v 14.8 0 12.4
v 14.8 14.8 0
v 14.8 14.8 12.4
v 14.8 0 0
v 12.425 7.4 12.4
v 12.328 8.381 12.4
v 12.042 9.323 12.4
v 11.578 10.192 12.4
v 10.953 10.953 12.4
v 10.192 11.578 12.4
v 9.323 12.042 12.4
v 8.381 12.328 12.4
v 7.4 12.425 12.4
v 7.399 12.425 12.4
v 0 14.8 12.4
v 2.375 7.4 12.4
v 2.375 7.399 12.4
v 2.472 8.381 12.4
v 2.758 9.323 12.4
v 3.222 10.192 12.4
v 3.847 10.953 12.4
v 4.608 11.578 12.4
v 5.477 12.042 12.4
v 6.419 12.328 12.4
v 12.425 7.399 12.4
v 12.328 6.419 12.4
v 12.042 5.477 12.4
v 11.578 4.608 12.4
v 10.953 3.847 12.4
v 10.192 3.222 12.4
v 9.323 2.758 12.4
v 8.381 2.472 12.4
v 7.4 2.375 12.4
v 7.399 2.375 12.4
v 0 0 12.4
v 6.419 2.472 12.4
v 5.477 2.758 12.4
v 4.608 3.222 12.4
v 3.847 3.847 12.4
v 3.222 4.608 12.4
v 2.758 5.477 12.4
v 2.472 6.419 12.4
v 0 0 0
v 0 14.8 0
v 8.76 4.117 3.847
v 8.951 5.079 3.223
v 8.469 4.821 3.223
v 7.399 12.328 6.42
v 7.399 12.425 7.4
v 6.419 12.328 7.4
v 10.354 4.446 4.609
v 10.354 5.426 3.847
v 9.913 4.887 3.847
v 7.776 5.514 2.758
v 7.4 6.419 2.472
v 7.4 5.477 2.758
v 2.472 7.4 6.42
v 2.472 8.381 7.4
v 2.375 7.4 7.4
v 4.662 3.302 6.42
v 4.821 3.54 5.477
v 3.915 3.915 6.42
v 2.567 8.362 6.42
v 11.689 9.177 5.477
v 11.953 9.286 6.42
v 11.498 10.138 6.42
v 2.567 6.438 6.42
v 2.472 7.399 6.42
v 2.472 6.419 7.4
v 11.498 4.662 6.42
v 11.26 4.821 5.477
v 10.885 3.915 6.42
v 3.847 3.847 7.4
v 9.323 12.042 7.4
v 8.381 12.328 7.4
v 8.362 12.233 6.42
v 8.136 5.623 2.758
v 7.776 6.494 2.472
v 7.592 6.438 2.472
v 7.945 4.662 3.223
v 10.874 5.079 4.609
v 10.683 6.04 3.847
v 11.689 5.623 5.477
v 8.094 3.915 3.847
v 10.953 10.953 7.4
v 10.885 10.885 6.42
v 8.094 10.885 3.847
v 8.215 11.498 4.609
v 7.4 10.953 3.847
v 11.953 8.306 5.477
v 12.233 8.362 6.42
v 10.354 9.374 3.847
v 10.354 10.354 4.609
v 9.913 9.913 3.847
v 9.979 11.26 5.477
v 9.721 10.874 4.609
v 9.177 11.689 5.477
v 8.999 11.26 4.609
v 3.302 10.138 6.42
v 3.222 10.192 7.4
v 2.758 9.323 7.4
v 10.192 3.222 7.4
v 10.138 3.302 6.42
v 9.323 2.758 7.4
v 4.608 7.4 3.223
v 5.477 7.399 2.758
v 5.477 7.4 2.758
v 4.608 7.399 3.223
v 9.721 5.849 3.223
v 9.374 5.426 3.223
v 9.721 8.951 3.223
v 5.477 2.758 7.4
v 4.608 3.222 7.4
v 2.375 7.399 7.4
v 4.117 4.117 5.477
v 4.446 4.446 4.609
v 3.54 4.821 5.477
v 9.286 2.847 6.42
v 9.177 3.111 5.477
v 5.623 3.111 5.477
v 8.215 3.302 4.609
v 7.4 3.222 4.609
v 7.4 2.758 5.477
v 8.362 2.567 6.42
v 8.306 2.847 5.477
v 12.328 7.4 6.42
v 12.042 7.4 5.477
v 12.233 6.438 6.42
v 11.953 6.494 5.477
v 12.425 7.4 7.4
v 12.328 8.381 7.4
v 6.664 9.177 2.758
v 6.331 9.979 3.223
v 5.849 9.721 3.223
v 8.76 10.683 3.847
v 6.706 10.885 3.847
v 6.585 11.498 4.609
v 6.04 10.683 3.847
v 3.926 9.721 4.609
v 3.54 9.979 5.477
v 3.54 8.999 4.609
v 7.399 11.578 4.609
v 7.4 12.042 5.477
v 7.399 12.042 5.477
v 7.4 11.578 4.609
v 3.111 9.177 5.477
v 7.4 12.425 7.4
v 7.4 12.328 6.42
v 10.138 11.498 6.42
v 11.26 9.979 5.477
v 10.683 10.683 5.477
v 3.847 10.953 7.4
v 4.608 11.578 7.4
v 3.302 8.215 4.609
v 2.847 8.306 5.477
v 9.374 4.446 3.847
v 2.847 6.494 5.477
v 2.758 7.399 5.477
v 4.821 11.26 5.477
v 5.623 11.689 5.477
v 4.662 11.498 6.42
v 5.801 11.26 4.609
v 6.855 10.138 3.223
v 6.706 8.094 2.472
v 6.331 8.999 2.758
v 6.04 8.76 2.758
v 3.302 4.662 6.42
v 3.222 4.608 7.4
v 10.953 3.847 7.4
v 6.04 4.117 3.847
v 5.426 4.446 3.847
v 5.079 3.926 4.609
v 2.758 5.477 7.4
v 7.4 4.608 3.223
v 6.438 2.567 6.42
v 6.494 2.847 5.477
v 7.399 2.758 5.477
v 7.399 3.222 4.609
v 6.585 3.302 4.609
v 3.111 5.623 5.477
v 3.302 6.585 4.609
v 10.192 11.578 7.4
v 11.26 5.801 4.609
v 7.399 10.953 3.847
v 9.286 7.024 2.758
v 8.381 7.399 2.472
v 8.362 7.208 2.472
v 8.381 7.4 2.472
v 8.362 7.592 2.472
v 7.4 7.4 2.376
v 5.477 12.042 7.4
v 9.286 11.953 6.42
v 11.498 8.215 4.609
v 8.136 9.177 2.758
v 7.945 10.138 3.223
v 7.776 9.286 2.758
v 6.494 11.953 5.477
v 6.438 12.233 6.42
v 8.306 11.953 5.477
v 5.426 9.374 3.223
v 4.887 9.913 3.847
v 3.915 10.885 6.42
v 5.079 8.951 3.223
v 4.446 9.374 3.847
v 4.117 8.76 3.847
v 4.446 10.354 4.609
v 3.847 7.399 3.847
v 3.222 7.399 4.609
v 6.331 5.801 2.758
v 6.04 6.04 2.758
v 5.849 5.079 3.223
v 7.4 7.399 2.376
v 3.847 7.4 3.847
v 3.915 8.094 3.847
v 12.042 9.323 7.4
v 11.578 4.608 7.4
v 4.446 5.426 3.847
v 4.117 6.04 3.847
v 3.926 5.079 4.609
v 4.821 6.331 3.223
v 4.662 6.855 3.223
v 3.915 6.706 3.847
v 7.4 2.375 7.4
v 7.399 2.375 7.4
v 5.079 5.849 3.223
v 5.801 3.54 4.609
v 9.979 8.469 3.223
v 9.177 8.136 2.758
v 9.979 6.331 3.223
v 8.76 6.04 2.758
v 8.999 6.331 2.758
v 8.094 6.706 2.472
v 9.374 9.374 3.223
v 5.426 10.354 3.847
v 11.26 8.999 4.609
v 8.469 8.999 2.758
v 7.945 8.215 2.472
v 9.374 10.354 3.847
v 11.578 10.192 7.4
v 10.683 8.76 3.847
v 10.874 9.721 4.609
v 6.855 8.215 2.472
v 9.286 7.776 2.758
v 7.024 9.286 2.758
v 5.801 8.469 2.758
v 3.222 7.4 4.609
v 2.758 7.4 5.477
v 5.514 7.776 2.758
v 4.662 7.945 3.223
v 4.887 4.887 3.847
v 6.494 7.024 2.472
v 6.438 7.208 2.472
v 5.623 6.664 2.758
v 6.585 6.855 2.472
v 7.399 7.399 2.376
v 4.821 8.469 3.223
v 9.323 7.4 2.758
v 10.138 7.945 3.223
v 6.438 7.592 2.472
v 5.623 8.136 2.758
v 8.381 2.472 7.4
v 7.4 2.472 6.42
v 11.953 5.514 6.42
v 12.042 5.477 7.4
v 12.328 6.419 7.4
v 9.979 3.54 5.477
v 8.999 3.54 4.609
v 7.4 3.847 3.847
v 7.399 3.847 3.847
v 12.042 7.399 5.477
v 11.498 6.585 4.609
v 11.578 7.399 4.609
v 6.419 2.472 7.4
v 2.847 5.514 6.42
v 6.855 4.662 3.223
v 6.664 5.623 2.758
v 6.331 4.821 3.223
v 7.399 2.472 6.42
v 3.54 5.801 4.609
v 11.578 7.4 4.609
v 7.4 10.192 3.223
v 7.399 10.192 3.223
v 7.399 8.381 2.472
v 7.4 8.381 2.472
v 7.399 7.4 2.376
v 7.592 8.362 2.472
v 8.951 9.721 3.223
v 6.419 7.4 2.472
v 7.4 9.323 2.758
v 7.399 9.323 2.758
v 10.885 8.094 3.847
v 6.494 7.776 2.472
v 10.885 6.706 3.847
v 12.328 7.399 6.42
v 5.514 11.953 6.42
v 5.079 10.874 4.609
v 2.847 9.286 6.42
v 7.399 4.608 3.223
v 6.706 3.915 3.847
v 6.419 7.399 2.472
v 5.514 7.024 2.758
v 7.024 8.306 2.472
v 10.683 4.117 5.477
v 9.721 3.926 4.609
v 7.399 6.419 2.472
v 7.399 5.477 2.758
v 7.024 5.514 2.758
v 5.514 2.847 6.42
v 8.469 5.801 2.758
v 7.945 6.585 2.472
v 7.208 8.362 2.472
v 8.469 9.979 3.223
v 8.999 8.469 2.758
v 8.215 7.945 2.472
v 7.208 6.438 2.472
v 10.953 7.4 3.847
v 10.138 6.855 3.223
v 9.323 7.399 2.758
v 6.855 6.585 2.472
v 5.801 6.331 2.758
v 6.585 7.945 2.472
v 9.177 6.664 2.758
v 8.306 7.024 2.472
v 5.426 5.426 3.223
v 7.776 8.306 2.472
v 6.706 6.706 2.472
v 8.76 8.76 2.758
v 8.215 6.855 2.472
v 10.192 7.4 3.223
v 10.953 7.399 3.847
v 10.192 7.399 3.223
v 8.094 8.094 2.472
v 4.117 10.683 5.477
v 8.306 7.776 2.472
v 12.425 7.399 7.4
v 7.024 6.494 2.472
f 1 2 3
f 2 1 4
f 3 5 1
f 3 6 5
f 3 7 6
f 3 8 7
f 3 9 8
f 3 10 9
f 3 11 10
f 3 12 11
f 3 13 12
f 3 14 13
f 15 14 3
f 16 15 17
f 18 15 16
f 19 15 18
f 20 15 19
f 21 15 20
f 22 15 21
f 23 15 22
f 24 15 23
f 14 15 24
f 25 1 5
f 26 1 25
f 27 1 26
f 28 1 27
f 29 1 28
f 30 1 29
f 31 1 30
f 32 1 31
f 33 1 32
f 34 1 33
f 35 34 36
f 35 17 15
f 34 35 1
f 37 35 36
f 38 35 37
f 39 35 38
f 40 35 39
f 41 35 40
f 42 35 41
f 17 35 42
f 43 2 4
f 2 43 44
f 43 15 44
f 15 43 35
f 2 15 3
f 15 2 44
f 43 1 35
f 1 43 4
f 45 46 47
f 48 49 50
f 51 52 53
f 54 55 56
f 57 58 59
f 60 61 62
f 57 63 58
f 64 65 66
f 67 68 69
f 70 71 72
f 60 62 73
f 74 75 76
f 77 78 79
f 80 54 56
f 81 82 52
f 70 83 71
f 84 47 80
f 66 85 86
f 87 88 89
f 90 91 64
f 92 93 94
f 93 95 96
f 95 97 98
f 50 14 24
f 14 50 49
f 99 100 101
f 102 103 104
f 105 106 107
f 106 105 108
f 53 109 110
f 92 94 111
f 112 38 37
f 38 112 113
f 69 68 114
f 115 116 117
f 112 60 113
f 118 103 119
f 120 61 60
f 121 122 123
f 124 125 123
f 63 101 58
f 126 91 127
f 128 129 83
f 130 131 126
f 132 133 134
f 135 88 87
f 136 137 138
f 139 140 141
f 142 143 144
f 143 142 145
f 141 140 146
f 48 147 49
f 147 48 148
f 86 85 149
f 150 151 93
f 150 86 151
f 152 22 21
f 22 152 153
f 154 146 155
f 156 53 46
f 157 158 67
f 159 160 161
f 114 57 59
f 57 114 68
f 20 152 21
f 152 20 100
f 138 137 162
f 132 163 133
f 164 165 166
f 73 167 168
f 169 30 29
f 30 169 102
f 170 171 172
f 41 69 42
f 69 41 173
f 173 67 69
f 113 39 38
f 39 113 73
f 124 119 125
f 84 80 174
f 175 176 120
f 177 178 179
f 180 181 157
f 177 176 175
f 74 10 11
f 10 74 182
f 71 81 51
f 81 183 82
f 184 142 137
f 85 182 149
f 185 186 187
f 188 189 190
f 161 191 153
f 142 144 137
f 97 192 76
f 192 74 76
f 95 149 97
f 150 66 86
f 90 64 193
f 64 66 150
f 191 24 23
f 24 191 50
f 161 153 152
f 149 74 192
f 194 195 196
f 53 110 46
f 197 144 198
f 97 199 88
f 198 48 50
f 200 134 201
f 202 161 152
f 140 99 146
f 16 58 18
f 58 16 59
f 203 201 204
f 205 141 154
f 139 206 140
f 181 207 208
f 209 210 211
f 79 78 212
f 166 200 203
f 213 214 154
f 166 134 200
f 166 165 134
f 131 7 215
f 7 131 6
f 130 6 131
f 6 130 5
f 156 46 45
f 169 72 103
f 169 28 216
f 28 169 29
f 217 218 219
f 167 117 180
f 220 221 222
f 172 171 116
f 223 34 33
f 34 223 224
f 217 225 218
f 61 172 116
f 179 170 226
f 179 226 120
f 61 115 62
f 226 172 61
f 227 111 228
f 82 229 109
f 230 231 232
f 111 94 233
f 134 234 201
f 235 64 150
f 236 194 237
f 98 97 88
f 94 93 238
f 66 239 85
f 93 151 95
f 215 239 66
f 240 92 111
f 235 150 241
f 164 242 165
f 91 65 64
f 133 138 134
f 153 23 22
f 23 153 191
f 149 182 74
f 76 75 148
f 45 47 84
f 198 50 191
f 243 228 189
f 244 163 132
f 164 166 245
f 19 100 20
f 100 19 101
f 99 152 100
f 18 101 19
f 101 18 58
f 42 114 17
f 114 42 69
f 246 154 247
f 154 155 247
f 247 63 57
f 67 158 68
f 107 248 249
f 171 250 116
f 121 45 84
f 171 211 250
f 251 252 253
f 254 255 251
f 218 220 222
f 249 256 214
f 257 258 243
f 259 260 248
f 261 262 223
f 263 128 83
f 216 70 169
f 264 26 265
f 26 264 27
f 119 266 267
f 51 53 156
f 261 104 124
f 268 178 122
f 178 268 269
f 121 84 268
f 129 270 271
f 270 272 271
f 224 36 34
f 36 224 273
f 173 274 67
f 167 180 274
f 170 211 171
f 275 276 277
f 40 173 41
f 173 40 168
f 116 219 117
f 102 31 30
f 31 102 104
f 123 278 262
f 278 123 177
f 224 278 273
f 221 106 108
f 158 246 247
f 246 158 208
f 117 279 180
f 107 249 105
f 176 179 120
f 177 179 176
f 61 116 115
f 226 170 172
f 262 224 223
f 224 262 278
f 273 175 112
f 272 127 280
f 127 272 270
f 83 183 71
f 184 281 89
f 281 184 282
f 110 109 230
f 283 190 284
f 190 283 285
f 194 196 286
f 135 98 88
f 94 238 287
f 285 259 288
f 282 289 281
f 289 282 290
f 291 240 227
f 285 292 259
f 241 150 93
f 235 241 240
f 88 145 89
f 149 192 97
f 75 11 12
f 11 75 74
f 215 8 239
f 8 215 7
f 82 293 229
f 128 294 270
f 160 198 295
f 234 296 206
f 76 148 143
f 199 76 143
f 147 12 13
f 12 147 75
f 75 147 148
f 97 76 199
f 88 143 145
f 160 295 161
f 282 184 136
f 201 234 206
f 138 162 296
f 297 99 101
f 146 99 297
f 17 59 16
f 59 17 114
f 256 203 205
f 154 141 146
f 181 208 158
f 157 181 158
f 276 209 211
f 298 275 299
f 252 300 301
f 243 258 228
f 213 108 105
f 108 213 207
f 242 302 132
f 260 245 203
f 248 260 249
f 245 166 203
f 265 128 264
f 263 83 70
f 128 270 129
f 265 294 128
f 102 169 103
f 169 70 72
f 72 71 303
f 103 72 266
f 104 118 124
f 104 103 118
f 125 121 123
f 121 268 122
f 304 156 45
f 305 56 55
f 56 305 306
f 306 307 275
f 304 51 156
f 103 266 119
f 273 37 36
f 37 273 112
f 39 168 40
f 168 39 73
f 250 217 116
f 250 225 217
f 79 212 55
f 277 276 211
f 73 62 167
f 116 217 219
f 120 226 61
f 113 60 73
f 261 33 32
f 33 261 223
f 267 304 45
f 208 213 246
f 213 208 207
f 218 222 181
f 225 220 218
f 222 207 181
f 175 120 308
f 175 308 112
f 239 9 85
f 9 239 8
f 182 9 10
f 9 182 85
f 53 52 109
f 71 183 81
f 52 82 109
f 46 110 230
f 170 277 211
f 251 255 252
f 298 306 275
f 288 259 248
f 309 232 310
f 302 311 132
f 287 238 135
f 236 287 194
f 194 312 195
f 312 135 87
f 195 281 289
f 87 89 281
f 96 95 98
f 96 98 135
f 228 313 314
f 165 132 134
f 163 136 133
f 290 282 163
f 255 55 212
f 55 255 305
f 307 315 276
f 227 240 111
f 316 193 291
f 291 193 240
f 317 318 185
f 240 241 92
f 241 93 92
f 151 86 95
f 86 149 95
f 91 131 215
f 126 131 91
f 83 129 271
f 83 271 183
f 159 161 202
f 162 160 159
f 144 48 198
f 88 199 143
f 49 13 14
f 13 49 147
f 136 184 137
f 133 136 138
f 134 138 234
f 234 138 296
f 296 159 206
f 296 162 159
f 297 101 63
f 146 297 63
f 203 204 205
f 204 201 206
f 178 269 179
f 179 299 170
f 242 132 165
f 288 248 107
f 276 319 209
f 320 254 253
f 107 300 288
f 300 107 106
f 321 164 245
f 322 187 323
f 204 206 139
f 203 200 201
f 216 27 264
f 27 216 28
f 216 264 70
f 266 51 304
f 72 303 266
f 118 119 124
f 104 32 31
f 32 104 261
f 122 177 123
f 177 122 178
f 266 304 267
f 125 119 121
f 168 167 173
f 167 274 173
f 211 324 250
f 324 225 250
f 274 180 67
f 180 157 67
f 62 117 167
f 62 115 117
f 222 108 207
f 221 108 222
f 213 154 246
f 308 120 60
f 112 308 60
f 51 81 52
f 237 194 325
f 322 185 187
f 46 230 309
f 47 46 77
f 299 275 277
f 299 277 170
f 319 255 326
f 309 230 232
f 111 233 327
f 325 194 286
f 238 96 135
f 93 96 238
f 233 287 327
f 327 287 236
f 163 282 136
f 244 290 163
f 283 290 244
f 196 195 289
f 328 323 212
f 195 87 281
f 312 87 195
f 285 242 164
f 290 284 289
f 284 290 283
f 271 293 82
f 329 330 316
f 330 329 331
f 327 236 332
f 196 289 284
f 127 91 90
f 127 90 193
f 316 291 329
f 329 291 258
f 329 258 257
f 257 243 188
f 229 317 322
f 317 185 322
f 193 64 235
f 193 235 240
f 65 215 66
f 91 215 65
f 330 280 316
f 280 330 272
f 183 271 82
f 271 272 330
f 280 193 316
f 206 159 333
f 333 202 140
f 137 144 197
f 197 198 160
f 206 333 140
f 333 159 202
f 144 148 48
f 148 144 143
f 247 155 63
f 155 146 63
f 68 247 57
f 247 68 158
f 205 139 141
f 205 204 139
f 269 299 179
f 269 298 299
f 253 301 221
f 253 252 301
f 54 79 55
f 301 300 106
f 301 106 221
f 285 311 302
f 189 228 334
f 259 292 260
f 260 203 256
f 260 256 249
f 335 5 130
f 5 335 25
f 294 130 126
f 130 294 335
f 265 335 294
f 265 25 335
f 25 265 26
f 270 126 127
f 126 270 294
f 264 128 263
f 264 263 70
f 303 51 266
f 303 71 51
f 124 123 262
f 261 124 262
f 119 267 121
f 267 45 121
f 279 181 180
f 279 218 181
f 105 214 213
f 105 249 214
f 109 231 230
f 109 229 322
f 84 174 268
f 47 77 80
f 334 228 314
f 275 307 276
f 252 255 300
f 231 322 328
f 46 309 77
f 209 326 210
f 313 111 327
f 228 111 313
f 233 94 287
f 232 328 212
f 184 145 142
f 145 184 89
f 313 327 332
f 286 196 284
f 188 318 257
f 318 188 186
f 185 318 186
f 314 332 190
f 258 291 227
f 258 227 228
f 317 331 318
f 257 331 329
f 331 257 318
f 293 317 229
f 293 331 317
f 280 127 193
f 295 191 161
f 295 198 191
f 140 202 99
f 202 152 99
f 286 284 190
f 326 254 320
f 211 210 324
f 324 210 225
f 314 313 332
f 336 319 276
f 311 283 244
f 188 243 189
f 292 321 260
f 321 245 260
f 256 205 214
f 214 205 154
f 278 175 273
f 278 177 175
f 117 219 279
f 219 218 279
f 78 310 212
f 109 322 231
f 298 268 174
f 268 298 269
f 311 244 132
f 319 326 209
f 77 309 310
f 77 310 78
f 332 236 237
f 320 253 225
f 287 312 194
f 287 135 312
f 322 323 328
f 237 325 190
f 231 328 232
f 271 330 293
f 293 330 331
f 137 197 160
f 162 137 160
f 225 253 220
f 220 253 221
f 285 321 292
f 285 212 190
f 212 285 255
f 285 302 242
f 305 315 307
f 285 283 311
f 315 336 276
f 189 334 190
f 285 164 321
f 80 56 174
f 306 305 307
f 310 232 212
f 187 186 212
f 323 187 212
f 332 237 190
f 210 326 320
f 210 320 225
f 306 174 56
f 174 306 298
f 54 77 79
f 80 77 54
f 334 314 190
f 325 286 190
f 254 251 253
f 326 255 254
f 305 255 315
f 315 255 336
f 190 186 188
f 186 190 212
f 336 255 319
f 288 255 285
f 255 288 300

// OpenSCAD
include <BOSL/constants.scad>
use <BOSL/shapes.scad>

// parameters
$fs=0.4/2;
nozzle = 0.4;
d = 6*nozzle;

l = 10;
w = 10;
h = 10;


difference() {
    cuboid([l+2*d, w+2*d, h+d], align=V_UP+V_RIGHT+V_BACK);
    translate([d,d,d]) color("red") cuboid([l, w, h+5], fillet=5, align=V_UP+V_RIGHT+V_BACK);
}
